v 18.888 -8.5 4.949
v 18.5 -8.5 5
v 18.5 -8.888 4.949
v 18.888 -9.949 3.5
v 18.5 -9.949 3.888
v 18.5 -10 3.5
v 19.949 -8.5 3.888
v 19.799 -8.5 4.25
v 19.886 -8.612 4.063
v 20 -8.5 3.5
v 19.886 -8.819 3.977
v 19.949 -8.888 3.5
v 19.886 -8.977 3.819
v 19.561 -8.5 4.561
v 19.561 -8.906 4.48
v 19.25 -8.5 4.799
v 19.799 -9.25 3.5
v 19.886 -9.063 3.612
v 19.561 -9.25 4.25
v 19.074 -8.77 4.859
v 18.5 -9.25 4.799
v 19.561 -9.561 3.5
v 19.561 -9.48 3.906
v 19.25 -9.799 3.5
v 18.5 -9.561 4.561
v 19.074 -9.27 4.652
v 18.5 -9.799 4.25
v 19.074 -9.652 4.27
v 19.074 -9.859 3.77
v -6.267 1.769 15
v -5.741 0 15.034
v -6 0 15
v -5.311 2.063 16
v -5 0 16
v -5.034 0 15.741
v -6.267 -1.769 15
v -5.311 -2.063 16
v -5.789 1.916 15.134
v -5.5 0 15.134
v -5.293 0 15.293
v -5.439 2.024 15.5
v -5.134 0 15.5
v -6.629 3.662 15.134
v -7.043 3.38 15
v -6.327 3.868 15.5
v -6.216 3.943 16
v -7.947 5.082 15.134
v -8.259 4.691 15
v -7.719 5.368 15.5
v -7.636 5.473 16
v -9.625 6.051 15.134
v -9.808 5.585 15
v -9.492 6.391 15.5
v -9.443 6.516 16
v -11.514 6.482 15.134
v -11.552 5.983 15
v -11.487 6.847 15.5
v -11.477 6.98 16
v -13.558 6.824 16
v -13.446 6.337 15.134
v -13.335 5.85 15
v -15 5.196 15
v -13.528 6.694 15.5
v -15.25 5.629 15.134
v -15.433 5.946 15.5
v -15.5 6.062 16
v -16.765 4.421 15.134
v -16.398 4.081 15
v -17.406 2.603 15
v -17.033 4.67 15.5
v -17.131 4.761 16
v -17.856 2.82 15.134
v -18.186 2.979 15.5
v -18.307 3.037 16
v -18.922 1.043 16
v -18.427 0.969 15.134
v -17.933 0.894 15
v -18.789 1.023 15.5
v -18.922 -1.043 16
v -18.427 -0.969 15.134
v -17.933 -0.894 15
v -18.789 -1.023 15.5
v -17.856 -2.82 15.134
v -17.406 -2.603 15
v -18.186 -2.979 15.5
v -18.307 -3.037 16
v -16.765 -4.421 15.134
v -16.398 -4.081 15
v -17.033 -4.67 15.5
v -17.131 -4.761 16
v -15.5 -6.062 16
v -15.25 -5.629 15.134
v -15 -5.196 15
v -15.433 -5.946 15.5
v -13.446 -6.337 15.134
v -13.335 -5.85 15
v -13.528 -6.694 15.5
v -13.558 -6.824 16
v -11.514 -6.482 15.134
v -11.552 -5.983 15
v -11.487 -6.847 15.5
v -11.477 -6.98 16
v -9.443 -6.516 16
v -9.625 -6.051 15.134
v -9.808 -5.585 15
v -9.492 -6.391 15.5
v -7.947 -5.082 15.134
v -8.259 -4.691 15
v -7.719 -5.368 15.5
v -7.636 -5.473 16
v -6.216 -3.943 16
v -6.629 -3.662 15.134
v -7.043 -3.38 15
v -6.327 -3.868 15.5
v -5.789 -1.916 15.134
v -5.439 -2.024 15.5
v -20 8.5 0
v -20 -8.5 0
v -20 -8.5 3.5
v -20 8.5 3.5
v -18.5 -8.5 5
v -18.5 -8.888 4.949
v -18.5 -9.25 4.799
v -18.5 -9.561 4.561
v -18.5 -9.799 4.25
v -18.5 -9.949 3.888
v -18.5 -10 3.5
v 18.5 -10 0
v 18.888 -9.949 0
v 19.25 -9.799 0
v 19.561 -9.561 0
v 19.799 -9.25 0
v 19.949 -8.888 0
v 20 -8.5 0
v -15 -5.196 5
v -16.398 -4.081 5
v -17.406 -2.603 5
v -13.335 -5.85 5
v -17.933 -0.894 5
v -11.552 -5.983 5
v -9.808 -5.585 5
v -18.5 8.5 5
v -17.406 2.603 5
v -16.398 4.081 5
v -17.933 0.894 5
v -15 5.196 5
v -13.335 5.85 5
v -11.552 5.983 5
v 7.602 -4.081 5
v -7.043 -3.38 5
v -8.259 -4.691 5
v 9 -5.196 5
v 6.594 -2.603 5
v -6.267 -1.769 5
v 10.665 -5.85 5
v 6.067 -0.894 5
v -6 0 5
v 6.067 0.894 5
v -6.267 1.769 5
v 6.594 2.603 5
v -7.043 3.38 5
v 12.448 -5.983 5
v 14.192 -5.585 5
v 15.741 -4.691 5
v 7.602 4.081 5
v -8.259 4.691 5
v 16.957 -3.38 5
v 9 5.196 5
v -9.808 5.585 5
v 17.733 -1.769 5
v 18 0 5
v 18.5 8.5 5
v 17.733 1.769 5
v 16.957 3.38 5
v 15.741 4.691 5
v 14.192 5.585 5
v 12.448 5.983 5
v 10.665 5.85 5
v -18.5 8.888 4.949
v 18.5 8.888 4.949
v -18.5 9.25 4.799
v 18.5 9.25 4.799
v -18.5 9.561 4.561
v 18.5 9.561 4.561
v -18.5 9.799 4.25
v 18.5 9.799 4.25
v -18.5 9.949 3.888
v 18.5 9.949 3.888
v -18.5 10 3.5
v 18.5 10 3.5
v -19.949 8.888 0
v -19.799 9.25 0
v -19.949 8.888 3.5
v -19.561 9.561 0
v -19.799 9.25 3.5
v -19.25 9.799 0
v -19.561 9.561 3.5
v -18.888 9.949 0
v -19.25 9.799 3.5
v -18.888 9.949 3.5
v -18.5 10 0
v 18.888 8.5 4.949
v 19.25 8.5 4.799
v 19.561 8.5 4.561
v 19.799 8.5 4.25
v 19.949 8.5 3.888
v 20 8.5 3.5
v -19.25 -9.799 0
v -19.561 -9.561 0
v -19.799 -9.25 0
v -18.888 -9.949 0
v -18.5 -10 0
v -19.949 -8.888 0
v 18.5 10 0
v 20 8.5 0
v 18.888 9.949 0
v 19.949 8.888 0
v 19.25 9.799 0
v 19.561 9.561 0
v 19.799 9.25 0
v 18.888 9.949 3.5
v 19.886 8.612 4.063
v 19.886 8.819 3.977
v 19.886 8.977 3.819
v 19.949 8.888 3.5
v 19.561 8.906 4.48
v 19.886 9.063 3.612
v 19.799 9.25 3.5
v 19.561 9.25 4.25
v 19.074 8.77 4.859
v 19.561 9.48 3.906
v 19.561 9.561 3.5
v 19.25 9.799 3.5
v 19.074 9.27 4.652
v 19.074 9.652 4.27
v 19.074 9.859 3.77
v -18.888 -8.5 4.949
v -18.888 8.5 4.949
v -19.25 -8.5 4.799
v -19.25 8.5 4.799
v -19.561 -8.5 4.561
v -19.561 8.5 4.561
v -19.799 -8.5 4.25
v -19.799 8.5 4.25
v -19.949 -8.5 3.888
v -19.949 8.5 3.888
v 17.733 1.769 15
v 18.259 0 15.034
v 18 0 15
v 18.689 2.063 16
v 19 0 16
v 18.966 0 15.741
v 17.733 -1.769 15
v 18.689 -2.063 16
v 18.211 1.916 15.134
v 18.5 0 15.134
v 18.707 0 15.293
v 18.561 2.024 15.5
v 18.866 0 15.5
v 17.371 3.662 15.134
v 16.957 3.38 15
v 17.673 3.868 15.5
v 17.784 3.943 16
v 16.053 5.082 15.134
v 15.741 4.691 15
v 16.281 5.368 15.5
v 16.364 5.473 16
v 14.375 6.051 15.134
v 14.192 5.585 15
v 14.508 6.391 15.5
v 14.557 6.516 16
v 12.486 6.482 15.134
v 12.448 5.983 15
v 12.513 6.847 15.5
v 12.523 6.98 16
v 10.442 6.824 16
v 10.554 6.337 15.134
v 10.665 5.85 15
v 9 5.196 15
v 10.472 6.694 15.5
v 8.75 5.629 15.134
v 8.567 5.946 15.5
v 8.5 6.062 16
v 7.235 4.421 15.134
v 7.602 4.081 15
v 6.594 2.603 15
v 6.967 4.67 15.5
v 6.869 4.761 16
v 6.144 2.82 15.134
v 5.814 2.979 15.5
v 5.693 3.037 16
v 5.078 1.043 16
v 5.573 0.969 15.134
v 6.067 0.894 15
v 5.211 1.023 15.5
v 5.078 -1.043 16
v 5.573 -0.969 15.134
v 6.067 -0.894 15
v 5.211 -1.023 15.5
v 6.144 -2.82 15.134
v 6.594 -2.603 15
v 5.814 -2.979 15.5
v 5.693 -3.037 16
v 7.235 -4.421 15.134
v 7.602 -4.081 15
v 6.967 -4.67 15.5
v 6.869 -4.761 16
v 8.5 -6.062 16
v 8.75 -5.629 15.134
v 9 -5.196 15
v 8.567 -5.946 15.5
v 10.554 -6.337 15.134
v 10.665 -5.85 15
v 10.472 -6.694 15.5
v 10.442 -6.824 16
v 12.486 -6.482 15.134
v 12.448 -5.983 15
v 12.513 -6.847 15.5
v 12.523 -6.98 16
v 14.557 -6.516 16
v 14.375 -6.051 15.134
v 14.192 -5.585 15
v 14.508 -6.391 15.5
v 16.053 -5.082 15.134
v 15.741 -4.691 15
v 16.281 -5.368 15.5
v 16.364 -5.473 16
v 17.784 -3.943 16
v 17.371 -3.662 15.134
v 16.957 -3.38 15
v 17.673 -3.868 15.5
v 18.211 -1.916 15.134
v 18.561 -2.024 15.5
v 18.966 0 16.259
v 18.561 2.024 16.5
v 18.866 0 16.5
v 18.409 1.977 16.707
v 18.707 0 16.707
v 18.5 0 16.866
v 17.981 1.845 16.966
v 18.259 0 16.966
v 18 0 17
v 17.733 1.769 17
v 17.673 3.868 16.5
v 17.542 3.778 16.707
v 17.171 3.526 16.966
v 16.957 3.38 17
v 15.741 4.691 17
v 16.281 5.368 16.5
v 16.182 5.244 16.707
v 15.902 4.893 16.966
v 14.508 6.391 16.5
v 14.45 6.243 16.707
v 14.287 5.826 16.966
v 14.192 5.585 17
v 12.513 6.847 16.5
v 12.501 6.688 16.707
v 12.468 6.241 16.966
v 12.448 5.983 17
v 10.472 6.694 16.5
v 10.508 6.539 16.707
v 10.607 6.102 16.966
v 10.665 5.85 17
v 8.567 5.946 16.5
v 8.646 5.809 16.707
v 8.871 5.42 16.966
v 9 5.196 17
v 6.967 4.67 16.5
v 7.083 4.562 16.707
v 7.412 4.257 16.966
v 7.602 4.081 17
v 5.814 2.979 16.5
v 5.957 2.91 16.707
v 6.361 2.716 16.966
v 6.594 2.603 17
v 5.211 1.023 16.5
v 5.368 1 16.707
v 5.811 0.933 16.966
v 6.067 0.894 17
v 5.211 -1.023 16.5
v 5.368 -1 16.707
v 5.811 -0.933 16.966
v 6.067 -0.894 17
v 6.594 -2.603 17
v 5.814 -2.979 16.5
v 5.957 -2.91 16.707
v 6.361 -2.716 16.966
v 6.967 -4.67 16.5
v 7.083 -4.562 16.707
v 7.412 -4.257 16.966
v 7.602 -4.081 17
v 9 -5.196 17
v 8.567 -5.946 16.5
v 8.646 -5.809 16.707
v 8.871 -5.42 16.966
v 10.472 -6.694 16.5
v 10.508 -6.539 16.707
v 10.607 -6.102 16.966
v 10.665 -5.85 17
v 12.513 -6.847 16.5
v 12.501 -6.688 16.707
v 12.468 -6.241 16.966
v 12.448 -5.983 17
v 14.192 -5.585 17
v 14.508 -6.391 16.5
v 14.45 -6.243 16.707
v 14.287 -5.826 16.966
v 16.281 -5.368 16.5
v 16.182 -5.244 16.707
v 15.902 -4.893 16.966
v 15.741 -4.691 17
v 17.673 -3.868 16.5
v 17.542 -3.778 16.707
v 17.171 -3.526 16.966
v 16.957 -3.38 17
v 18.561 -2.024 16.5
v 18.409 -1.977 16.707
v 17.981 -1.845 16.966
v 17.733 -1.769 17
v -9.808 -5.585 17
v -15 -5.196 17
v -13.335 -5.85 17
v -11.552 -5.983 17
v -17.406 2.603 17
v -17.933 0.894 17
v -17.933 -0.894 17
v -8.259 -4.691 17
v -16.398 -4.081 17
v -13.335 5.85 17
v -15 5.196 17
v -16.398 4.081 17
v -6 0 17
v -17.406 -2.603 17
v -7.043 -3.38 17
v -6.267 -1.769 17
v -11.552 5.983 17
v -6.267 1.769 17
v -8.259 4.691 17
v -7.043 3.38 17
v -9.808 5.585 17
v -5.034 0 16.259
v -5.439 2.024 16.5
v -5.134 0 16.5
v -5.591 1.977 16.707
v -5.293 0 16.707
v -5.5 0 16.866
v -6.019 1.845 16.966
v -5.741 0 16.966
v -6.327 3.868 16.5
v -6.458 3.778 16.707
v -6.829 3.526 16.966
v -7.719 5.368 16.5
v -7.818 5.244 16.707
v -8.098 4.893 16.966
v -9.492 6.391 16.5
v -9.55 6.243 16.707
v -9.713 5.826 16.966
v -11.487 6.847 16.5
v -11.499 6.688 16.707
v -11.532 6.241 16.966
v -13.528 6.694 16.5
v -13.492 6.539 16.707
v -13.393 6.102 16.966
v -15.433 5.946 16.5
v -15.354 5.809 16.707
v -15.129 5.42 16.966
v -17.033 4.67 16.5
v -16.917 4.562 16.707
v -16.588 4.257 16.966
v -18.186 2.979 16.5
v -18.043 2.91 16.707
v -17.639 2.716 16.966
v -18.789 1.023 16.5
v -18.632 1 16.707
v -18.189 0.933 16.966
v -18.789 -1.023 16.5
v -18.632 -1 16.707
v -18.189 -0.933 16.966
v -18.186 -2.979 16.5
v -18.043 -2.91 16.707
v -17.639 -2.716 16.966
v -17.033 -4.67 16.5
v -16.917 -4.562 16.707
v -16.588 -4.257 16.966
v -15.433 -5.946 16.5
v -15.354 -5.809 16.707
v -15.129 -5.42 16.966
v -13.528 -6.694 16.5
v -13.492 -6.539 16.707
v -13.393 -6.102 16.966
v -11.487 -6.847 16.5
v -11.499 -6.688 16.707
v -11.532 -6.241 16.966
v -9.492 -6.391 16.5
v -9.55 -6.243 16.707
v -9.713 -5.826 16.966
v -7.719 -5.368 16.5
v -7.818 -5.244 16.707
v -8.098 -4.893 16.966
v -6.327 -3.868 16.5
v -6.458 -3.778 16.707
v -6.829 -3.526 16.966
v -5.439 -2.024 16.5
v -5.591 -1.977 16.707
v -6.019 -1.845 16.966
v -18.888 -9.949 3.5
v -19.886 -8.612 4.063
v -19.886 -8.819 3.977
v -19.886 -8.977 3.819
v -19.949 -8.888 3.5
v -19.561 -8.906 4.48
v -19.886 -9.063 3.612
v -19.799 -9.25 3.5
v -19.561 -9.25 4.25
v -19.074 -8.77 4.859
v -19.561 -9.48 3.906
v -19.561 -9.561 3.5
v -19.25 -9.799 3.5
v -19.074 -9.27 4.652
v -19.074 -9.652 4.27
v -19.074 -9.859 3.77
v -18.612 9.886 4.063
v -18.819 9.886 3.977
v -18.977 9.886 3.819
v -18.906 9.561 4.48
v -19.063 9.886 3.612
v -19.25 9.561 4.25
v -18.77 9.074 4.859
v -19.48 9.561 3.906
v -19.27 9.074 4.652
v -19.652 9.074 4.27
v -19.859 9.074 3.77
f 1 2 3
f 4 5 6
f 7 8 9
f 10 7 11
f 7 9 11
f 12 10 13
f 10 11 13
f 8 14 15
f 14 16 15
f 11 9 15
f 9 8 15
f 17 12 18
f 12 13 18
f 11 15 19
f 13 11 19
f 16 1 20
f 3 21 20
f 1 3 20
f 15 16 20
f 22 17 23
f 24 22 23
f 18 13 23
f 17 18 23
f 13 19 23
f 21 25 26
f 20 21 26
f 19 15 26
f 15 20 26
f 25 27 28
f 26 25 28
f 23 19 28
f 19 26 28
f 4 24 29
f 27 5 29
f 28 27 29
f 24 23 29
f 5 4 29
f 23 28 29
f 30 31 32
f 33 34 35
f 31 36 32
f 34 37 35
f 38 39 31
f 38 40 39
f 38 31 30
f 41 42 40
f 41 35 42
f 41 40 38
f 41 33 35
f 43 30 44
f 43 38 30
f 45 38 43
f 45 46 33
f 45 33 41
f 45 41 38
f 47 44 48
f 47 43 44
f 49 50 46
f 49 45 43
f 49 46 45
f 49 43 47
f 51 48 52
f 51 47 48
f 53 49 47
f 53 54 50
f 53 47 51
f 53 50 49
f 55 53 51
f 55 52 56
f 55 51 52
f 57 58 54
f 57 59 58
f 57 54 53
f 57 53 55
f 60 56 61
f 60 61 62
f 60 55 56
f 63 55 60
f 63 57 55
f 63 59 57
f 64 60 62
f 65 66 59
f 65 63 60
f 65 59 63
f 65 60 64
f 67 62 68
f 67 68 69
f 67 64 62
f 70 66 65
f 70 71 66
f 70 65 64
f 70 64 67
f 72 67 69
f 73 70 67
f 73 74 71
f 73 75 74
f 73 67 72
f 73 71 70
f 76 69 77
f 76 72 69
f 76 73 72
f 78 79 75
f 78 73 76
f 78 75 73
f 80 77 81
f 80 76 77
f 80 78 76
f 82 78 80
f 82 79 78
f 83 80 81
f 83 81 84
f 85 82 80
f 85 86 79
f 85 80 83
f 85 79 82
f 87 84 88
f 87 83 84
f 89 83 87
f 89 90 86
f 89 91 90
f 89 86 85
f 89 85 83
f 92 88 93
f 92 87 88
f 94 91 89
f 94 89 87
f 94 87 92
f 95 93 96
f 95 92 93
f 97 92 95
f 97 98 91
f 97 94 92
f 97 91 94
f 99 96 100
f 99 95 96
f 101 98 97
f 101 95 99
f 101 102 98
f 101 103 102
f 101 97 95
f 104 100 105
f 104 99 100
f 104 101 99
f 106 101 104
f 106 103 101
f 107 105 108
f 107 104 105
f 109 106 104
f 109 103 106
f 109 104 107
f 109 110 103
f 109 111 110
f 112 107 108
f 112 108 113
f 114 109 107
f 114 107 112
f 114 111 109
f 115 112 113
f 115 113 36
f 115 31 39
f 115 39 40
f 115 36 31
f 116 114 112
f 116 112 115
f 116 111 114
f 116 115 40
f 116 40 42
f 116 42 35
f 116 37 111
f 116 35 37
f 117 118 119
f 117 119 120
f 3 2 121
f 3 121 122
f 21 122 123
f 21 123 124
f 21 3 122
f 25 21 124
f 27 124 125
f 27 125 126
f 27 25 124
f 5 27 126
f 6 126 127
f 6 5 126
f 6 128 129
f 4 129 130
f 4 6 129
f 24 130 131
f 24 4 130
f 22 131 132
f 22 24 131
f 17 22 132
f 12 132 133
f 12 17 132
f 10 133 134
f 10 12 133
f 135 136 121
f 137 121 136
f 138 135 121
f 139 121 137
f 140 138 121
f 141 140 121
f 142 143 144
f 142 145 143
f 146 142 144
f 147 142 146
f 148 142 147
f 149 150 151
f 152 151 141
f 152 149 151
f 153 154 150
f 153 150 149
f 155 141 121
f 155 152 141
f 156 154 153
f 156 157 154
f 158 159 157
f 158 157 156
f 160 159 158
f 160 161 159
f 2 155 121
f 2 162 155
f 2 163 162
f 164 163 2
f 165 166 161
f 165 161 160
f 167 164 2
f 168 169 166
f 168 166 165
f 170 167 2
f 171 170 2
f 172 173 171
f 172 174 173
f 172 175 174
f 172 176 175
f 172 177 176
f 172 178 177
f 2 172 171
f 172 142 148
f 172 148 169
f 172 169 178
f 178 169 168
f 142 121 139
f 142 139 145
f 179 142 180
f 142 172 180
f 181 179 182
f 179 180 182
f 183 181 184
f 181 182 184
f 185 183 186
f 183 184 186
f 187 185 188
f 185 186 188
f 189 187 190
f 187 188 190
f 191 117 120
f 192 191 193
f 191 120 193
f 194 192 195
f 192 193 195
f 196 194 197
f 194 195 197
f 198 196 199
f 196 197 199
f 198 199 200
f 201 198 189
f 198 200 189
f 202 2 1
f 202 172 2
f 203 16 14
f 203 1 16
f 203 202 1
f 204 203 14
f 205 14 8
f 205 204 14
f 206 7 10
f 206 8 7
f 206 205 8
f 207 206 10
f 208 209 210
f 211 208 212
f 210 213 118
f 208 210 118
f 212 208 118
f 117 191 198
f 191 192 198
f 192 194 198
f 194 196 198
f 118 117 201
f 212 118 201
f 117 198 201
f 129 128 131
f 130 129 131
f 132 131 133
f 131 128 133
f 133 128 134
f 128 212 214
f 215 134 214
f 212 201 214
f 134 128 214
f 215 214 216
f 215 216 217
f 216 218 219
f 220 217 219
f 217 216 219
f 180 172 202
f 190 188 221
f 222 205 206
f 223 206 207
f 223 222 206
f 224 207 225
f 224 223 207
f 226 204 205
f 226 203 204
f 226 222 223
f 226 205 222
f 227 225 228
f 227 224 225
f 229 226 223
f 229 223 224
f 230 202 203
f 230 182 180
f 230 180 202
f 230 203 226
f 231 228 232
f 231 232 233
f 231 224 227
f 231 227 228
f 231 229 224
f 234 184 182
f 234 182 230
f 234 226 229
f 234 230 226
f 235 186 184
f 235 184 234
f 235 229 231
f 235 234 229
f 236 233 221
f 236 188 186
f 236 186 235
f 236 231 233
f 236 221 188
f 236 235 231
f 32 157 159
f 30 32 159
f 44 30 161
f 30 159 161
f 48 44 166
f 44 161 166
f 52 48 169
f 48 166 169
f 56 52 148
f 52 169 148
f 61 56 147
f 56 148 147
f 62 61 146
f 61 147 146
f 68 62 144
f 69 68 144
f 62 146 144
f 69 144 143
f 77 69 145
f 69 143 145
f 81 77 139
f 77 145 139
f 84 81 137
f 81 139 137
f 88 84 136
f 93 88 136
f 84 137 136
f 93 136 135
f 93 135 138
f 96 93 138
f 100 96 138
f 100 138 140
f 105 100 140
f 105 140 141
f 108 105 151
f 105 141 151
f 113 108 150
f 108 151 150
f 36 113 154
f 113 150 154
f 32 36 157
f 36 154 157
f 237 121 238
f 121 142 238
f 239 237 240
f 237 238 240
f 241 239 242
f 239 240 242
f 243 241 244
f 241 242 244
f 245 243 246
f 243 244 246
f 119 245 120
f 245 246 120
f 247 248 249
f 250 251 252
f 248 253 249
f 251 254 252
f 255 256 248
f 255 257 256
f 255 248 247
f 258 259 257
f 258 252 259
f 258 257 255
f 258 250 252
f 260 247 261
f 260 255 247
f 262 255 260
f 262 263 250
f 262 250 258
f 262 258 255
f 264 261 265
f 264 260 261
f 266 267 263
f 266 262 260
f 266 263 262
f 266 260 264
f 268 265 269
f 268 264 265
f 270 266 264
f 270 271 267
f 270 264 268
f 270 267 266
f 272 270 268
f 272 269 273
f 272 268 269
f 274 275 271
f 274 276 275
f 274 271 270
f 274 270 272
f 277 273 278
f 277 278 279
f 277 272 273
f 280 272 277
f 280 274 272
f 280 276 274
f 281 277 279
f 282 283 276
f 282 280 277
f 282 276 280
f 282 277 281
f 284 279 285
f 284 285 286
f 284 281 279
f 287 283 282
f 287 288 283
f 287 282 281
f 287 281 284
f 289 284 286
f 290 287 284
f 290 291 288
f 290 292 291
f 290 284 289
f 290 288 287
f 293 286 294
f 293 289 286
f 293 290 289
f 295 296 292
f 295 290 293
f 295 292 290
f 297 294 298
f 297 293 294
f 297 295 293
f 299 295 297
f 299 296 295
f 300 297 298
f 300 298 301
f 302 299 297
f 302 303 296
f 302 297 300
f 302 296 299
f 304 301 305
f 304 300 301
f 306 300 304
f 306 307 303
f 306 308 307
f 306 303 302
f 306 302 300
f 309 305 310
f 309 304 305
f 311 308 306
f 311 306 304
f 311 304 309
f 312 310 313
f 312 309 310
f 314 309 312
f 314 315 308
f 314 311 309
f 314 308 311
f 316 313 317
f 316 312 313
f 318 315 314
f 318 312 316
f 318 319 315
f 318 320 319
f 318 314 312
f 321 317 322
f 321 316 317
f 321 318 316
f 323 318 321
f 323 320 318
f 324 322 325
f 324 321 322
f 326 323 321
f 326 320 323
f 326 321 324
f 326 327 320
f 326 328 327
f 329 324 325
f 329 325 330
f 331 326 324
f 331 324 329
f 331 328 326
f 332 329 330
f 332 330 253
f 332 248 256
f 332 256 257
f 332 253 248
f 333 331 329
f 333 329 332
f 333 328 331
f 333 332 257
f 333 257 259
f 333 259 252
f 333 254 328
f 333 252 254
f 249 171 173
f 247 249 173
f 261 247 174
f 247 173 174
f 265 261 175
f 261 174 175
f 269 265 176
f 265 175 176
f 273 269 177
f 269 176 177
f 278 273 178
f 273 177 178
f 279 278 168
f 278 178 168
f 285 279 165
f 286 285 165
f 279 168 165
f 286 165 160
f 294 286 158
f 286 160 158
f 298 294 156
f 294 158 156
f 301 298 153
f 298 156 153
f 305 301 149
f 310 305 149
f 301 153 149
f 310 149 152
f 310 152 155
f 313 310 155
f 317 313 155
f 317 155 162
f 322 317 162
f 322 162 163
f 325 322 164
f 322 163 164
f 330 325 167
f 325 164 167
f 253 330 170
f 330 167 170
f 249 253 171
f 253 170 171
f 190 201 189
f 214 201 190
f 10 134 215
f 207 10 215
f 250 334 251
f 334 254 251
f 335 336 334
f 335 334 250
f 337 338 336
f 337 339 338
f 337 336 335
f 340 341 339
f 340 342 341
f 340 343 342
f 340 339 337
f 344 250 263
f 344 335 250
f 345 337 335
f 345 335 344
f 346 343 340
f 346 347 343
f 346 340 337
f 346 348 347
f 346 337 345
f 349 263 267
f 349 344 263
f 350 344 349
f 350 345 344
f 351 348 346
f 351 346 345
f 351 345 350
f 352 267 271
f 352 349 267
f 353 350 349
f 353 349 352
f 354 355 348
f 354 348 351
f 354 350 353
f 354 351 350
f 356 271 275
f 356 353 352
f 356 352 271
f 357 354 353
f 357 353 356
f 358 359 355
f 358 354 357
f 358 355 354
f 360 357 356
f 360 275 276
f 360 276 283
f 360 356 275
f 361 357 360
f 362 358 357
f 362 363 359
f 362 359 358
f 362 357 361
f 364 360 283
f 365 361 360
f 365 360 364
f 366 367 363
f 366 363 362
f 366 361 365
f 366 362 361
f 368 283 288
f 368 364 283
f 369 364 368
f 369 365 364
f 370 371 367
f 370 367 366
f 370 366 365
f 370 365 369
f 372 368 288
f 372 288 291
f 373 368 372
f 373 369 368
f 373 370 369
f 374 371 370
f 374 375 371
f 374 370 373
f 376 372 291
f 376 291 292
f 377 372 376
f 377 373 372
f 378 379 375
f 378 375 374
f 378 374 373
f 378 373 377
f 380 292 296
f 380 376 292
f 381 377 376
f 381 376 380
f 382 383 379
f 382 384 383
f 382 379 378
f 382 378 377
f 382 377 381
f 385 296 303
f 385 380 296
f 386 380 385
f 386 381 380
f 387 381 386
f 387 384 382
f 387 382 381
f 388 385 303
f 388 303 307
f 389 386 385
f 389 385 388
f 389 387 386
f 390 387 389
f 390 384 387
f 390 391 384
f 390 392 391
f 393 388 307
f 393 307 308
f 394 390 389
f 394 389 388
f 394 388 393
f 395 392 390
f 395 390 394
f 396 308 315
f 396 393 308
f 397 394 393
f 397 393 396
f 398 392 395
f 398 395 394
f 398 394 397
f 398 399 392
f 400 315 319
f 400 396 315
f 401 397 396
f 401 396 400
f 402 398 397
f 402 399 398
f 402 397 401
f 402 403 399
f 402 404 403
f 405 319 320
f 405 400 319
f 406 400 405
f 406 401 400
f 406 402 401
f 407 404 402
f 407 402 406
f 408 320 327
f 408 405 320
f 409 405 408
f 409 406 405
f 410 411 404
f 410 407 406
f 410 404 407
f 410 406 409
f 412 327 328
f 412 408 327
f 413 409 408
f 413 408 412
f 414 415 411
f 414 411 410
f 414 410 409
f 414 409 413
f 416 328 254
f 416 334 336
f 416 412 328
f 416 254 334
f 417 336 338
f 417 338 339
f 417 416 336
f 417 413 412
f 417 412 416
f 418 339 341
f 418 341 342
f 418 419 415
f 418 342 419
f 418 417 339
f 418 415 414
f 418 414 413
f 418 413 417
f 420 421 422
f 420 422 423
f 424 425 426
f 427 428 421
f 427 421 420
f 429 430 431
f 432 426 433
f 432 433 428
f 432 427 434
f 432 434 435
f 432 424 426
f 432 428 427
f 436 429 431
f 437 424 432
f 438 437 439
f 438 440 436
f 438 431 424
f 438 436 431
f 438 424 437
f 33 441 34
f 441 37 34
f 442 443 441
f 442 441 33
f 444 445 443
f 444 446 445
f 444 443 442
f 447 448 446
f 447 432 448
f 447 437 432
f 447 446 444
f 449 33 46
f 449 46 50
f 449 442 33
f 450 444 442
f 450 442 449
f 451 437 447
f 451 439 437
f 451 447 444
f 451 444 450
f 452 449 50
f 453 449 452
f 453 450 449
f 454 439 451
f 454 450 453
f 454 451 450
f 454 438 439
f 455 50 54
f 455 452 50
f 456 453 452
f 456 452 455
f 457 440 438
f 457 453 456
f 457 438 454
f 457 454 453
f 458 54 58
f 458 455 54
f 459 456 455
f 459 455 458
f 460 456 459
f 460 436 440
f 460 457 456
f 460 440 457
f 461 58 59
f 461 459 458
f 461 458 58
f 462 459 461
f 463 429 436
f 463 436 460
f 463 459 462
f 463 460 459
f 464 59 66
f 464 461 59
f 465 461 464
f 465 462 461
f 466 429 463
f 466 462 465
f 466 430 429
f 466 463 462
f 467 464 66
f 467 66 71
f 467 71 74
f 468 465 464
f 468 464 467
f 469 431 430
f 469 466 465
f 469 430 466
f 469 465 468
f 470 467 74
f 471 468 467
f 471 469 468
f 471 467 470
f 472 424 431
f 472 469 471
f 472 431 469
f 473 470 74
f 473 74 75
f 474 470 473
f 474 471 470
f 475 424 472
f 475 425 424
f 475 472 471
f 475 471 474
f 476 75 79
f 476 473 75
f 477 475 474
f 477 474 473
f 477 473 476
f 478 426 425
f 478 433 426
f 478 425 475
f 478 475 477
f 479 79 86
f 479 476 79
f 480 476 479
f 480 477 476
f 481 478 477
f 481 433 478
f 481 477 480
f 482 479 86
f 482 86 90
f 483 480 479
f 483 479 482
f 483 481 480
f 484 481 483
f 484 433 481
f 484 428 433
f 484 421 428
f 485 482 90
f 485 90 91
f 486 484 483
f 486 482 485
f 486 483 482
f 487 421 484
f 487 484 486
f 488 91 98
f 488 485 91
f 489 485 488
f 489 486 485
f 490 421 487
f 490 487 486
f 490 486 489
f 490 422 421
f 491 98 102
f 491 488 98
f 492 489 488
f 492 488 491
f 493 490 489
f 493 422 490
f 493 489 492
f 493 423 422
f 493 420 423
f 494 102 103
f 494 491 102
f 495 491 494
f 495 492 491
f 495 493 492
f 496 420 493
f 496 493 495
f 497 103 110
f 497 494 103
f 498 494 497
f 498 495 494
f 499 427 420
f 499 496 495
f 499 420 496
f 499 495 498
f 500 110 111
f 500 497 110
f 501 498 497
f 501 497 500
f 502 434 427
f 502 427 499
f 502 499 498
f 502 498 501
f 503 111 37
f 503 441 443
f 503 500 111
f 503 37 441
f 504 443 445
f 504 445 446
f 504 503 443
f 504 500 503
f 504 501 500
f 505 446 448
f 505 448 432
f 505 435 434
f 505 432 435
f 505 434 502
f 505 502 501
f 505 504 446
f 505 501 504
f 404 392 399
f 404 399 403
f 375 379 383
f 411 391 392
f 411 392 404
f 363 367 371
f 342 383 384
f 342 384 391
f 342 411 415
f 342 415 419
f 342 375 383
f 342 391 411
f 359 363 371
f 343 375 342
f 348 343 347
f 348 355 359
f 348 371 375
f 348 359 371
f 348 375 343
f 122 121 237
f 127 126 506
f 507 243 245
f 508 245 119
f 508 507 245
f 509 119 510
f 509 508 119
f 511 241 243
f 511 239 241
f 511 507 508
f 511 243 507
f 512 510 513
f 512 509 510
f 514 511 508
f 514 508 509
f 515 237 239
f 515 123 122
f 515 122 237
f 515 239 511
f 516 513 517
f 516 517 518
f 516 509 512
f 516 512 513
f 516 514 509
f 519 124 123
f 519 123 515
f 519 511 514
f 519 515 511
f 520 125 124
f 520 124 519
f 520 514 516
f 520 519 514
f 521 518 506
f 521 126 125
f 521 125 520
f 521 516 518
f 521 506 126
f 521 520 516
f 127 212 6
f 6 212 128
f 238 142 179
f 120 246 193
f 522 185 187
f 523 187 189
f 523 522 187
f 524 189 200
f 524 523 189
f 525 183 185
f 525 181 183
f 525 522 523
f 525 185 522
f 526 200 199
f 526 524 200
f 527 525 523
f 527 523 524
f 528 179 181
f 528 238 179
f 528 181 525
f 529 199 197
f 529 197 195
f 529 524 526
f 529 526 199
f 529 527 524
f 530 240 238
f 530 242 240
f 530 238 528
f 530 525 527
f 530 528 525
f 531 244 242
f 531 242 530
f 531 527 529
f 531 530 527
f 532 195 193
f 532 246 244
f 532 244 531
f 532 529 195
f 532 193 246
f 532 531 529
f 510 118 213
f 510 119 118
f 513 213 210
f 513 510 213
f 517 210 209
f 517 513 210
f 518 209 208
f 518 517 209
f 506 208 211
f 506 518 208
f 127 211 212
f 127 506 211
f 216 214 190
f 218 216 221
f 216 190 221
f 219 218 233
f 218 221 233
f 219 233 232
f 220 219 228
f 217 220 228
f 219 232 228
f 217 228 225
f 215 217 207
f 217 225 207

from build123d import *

# Parameters (mm, degrees)
F0_W     = 40
F0_H     = 20
F1_DEPTH = 5
F2_R     = 6
F3_DEPTH = 10
F4_R     = 7
F5_DEPTH = 2
F6_R     = 7
F7_DEPTH = 2
F8_R     = 1.5
F9_R     = 0.99999


# Not quite as in the source:
# - a fillet or chamfer is up to 0.001 mm smaller than in the source, because OpenCascade refuses the exact size


with BuildPart() as f1:
    # F0 (on Top) → F1 (new body)
    with BuildSketch(Plane.XY):
        Rectangle(F0_W, F0_H)
    extrude(amount=F1_DEPTH)

    # F2 (on face) → F3 (join)
    with BuildSketch(Plane.XY.offset(5)):
        with Locations((-12, 0)):
            Circle(F2_R)
        with Locations((12, 0)):
            Circle(F2_R)
    extrude(amount=F3_DEPTH)

    # F4 (on face) → F5 (join)
    with BuildSketch(Plane.XY.offset(15)):
        with Locations((-12, 0)):
            Circle(F4_R)
    extrude(amount=F5_DEPTH)

    # F6 (on face) → F7 (join)
    with BuildSketch(Plane.XY.offset(15)):
        with Locations((12, 0)):
            Circle(F6_R)
    extrude(amount=F7_DEPTH)

    # F8
    f8_edges = [f1.edges().sort_by_distance(p)[0] for p in [
        (0, -10, 5),
        (-20, 0, 5),
        (0, 10, 5),
        (20, 0, 5),
        (20, -10, 2.5),
        (20, 10, 2.5),
        (-20, 10, 2.5),
        (-20, -10, 2.5),
    ]]
    fillet(f8_edges, radius=F8_R)

    # F9 (radius 1 in the source; OpenCascade refuses exactly that, so slightly less here)
    f9_edges = [f1.edges().sort_by_distance(p)[0] for p in [
        (-19, 0, 15),
        (5, 0, 15),
        (-19, 0, 17),
        (5, 0, 17),
    ]]
    fillet(f9_edges, radius=F9_R)


solid = f1.part
